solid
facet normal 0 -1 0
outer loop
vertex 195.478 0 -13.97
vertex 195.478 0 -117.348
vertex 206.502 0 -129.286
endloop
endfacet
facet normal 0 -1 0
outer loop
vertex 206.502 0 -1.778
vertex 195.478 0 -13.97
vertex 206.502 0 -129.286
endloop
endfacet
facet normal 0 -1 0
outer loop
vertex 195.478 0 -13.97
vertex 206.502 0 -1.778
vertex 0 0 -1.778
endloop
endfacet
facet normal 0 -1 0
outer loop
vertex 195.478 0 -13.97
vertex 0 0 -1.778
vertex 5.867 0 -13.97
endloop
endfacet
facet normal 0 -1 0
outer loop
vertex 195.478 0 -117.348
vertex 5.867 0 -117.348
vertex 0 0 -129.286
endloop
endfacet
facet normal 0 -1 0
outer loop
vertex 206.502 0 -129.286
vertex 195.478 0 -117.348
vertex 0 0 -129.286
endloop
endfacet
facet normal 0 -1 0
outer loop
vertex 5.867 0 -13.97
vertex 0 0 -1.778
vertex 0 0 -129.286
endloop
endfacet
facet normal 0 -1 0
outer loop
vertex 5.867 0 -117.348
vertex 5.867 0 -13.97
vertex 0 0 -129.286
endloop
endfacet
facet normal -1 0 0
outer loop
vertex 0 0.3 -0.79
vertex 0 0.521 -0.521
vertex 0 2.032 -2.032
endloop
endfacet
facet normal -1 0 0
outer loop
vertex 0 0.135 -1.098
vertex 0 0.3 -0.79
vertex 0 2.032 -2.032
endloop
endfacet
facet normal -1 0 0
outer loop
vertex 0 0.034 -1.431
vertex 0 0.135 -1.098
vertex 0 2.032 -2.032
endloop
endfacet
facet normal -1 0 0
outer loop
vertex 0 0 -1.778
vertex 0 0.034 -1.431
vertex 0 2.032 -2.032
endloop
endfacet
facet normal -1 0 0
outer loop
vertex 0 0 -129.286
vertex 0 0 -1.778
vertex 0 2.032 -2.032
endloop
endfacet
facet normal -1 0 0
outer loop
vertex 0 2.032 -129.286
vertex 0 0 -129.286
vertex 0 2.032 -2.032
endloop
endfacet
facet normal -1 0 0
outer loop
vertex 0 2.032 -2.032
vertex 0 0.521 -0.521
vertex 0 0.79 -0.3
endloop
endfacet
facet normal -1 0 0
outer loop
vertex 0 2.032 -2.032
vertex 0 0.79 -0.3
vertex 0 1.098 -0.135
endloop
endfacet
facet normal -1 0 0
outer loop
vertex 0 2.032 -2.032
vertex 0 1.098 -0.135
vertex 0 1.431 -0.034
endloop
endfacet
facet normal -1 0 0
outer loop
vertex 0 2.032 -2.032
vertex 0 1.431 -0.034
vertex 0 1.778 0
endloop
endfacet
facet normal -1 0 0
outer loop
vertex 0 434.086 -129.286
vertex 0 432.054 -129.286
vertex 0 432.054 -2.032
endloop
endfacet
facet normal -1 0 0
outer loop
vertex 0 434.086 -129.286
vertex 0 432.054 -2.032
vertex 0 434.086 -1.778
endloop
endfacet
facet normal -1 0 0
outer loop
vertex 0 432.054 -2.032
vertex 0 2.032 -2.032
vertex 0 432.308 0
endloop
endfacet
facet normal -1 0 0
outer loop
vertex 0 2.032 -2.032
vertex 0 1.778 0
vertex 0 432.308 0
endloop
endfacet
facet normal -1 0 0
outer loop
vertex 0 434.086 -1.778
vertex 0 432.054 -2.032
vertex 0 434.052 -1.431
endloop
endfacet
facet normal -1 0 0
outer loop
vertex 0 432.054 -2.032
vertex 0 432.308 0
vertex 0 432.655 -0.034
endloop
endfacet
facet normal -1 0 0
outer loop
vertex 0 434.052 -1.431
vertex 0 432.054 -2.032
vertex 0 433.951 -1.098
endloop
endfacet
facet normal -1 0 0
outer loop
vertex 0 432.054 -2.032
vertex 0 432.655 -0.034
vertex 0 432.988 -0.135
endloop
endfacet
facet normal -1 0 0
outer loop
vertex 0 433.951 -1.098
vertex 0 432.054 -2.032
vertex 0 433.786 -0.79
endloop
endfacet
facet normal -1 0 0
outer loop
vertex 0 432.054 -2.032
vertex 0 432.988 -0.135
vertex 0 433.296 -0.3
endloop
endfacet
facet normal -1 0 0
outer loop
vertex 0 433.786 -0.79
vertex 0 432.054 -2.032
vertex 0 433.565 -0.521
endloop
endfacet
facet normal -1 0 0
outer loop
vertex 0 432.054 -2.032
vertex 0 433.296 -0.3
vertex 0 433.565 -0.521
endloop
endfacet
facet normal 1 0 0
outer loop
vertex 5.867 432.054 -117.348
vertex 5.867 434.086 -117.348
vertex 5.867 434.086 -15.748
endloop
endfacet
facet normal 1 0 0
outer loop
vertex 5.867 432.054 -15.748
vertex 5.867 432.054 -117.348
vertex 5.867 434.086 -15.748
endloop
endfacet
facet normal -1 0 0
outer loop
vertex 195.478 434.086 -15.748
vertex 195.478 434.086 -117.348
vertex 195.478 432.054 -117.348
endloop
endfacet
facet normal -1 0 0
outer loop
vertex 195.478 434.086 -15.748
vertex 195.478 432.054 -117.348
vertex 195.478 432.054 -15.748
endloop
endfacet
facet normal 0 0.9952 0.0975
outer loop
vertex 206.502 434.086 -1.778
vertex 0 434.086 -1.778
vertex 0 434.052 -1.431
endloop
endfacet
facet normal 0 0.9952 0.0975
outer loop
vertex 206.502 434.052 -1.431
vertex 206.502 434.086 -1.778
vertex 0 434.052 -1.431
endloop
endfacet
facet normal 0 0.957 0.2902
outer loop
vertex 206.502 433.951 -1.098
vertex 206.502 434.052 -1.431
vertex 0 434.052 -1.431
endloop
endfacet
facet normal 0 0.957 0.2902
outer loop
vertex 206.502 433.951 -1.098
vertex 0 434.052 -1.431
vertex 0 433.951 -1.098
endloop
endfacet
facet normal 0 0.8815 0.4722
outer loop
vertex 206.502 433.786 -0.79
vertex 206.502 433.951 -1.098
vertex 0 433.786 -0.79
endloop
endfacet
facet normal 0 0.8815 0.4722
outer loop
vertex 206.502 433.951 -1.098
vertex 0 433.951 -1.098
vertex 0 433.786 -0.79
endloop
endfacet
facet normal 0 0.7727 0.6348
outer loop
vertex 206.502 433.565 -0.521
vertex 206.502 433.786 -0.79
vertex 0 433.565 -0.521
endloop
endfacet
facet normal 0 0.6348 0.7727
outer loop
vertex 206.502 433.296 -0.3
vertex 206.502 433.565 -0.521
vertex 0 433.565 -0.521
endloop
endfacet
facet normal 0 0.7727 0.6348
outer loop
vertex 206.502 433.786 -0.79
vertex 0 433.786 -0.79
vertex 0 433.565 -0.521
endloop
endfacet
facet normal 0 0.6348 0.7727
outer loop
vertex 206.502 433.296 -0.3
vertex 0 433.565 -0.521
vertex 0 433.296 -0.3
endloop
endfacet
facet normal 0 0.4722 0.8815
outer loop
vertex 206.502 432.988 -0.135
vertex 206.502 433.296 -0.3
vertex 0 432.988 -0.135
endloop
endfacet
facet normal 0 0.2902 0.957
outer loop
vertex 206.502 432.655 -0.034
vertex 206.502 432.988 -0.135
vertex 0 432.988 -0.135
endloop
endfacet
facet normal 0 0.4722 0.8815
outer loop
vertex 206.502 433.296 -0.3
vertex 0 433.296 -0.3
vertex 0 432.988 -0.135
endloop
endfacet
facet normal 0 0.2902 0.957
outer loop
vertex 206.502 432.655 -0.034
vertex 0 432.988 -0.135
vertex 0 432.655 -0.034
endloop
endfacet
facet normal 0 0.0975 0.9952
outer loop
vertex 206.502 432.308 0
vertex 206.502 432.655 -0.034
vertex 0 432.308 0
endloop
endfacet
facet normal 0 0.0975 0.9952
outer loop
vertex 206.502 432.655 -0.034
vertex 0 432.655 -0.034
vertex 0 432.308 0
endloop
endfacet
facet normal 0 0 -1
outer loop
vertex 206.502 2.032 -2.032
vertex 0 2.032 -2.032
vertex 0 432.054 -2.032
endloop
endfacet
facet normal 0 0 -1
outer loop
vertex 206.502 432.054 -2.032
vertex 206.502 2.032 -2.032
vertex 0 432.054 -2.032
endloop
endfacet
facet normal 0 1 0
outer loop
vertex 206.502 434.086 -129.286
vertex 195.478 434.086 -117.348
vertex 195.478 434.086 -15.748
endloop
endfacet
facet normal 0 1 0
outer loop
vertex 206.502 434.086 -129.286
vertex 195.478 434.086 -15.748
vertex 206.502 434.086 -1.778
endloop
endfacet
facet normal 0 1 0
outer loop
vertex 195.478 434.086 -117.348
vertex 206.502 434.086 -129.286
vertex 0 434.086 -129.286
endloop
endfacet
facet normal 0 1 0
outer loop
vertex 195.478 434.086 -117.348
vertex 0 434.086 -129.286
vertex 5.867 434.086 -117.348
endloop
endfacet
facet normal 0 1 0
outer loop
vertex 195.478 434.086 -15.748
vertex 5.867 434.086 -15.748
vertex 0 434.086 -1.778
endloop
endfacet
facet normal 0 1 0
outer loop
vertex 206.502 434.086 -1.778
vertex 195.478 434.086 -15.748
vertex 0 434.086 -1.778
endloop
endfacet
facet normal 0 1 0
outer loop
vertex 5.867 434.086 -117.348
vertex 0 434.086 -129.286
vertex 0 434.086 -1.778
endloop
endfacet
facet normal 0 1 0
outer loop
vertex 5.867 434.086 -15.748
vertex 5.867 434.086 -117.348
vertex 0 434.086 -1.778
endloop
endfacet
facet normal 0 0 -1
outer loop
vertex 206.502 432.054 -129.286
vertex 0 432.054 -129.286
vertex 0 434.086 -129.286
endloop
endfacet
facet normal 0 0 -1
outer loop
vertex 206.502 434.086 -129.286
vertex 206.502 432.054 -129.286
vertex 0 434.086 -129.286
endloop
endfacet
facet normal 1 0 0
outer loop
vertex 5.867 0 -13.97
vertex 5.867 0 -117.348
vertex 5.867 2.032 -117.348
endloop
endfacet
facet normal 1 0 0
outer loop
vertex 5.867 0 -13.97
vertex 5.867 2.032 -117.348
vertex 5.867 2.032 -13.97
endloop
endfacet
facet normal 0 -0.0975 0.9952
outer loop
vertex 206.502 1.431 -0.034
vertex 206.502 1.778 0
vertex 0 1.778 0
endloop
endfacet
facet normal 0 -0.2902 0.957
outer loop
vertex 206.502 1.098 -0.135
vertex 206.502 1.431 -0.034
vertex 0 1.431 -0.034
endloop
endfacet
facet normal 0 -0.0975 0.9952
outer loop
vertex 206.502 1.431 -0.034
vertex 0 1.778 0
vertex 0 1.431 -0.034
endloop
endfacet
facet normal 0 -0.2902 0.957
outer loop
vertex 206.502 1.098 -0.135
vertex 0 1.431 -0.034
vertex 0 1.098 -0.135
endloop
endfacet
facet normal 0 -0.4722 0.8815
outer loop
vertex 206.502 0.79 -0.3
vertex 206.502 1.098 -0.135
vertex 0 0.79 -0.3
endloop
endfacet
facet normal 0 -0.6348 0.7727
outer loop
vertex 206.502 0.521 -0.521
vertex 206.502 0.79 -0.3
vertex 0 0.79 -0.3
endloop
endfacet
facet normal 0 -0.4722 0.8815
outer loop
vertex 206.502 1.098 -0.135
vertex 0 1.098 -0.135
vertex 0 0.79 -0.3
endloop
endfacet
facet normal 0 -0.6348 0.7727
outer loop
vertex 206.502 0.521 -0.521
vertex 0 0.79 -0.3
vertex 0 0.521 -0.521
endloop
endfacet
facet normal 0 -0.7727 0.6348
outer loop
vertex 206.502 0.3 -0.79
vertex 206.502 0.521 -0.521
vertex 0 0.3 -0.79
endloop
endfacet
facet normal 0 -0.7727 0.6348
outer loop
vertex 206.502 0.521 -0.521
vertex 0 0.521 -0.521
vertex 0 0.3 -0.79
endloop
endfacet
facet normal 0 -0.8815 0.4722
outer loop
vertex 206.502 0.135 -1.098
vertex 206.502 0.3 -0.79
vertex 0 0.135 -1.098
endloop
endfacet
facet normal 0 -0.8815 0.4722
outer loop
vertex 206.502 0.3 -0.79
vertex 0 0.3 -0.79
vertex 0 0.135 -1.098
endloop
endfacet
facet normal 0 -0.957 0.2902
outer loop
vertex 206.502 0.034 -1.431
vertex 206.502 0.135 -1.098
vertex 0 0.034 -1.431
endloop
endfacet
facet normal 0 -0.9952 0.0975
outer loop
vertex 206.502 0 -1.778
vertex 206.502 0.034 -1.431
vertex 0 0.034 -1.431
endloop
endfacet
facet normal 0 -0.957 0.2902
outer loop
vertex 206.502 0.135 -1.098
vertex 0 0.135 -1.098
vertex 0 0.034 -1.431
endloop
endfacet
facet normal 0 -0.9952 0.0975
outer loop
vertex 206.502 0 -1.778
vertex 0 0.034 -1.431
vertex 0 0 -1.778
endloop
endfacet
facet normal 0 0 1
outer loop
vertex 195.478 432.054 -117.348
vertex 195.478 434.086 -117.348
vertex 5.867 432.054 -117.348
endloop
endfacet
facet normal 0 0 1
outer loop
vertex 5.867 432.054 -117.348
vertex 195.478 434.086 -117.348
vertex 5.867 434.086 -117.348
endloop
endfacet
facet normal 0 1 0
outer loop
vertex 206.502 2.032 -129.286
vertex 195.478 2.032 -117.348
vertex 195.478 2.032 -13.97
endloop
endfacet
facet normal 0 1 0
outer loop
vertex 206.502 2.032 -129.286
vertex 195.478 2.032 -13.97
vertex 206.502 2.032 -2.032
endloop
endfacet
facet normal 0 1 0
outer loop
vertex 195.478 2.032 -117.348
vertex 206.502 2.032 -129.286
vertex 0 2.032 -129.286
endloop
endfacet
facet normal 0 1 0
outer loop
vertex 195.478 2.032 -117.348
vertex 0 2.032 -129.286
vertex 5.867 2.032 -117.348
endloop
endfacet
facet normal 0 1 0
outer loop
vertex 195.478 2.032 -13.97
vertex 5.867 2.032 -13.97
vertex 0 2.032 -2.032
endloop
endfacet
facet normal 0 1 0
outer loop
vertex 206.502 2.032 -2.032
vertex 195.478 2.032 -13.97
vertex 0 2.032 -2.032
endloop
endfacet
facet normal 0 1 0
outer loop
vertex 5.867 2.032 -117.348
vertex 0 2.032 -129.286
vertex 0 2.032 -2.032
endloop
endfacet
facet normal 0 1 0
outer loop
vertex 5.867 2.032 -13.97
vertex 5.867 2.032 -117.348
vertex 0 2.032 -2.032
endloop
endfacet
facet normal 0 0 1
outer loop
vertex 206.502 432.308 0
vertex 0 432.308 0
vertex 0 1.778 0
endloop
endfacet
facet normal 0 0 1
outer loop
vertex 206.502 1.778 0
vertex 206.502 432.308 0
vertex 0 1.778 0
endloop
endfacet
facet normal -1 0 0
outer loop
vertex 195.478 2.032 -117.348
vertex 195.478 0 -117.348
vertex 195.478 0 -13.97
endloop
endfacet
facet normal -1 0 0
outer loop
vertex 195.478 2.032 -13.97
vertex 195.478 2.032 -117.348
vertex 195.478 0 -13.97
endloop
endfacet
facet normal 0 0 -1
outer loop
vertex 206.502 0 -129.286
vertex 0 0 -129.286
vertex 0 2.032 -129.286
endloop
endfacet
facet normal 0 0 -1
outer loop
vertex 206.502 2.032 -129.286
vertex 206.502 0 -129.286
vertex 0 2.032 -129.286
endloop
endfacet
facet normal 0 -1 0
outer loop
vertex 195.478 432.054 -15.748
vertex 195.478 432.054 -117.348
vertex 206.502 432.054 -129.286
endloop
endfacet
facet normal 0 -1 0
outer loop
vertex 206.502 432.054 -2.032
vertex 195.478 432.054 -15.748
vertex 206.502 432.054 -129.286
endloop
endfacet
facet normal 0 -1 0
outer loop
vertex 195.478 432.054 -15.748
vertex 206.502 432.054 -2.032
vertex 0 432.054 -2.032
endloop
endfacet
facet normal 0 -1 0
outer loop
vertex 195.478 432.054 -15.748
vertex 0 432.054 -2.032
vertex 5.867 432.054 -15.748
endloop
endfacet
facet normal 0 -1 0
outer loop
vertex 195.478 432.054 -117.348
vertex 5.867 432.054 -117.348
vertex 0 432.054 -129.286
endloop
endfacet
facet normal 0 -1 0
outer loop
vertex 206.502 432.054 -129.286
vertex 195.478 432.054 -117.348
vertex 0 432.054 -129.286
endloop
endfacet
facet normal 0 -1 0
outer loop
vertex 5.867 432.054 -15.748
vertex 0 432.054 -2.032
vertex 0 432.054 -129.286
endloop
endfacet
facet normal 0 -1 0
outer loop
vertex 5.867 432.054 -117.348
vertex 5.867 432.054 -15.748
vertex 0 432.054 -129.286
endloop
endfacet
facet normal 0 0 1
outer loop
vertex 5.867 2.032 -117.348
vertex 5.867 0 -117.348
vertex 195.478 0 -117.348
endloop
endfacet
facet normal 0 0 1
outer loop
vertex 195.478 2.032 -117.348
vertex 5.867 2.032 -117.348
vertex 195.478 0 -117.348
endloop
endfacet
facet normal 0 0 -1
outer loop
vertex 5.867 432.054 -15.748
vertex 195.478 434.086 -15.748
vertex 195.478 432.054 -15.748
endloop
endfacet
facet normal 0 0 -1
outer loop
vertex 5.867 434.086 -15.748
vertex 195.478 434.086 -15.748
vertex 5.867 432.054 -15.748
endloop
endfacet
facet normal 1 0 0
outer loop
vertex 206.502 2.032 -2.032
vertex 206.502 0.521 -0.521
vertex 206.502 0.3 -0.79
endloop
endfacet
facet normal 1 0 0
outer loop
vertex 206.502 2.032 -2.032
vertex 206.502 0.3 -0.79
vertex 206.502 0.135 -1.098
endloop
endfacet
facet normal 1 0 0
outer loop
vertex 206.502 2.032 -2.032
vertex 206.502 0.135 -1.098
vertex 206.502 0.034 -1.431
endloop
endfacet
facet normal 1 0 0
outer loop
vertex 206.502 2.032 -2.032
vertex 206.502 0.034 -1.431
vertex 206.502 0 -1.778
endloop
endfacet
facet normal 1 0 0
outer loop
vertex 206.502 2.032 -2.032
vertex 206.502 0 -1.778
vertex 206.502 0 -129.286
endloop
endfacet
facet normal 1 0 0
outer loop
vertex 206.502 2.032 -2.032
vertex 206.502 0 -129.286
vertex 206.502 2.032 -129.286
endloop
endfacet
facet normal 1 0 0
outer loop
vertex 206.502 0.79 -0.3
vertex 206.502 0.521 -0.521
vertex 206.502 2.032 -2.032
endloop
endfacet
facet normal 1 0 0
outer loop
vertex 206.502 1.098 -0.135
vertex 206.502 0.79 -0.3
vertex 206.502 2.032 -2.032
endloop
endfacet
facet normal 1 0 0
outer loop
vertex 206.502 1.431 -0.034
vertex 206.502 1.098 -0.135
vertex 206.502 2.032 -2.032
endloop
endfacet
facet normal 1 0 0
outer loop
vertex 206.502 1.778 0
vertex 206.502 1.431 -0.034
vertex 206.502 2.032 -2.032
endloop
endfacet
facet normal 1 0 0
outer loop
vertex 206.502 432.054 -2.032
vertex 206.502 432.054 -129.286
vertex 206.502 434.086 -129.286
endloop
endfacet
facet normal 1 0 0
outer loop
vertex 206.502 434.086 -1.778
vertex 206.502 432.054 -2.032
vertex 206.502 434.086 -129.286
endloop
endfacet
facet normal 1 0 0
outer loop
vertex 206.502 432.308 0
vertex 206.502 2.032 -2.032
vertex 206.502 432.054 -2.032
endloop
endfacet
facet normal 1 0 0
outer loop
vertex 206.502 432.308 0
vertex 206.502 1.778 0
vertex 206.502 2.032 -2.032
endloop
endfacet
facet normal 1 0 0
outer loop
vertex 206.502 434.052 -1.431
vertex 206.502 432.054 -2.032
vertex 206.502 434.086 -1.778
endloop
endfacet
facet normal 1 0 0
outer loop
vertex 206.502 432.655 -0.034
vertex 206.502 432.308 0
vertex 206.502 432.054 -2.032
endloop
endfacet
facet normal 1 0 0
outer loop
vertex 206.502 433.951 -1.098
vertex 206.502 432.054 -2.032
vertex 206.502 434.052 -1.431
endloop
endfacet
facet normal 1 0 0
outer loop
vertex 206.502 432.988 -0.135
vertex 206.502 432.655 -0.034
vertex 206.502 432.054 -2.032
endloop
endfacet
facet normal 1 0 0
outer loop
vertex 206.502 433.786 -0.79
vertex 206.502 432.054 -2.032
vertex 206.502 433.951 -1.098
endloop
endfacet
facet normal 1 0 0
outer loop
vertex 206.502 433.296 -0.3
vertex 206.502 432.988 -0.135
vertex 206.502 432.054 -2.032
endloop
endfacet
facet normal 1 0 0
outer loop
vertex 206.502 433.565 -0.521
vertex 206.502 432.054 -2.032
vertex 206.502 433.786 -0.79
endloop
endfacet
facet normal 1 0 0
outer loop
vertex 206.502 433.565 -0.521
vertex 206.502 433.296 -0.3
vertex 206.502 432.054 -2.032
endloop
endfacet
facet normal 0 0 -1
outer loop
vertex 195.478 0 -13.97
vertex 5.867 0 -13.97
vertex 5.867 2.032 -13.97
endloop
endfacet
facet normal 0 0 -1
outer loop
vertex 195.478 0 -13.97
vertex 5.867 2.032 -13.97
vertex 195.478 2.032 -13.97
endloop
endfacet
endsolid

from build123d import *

# Parameters (mm, degrees)
F1_DEPTH = 206.502
F2_W     = 189.611
F2_H     = 103.378
F3_DEPTH = 25.4
F4_W     = 189.611
F4_H     = 101.6
F5_DEPTH = 25.4


with BuildPart() as f1:
    # F0 (on Right) → F1 (new body)
    with BuildSketch(Plane.YZ):
        with BuildLine():
            Line((432.308, 0), (1.778, 0))
            ThreePointArc((1.778, 0), (0.520764, -0.520764), (0, -1.778))
            Line((0, -1.778), (0, -129.286))
            Line((0, -129.286), (2.032, -129.286))
            Line((2.032, -129.286), (2.032, -2.032))
            Line((2.032, -2.032), (432.054, -2.032))
            Line((432.054, -2.032), (432.054, -129.286))
            Line((432.054, -129.286), (434.086, -129.286))
            Line((434.086, -129.286), (434.086, -1.778))
            ThreePointArc((434.086, -1.778), (433.565236, -0.520764), (432.308, 0))
        make_face()
    extrude(amount=F1_DEPTH)

    # F2 (on face) → F3 (cut)
    with BuildSketch(Plane.XZ):
        with Locations((100.6729, -65.659)):
            Rectangle(F2_W, F2_H)
    extrude(amount=-F3_DEPTH, mode=Mode.SUBTRACT)

    # F4 (on face) → F5 (cut)
    with BuildSketch(Plane(origin=(0, 434.086, 0), x_dir=(-1, 0, 0), z_dir=(0, 1, 0))):
        with Locations((-100.6729, -66.548)):
            Rectangle(F4_W, F4_H)
    extrude(amount=-F5_DEPTH, mode=Mode.SUBTRACT)


solid = f1.part
